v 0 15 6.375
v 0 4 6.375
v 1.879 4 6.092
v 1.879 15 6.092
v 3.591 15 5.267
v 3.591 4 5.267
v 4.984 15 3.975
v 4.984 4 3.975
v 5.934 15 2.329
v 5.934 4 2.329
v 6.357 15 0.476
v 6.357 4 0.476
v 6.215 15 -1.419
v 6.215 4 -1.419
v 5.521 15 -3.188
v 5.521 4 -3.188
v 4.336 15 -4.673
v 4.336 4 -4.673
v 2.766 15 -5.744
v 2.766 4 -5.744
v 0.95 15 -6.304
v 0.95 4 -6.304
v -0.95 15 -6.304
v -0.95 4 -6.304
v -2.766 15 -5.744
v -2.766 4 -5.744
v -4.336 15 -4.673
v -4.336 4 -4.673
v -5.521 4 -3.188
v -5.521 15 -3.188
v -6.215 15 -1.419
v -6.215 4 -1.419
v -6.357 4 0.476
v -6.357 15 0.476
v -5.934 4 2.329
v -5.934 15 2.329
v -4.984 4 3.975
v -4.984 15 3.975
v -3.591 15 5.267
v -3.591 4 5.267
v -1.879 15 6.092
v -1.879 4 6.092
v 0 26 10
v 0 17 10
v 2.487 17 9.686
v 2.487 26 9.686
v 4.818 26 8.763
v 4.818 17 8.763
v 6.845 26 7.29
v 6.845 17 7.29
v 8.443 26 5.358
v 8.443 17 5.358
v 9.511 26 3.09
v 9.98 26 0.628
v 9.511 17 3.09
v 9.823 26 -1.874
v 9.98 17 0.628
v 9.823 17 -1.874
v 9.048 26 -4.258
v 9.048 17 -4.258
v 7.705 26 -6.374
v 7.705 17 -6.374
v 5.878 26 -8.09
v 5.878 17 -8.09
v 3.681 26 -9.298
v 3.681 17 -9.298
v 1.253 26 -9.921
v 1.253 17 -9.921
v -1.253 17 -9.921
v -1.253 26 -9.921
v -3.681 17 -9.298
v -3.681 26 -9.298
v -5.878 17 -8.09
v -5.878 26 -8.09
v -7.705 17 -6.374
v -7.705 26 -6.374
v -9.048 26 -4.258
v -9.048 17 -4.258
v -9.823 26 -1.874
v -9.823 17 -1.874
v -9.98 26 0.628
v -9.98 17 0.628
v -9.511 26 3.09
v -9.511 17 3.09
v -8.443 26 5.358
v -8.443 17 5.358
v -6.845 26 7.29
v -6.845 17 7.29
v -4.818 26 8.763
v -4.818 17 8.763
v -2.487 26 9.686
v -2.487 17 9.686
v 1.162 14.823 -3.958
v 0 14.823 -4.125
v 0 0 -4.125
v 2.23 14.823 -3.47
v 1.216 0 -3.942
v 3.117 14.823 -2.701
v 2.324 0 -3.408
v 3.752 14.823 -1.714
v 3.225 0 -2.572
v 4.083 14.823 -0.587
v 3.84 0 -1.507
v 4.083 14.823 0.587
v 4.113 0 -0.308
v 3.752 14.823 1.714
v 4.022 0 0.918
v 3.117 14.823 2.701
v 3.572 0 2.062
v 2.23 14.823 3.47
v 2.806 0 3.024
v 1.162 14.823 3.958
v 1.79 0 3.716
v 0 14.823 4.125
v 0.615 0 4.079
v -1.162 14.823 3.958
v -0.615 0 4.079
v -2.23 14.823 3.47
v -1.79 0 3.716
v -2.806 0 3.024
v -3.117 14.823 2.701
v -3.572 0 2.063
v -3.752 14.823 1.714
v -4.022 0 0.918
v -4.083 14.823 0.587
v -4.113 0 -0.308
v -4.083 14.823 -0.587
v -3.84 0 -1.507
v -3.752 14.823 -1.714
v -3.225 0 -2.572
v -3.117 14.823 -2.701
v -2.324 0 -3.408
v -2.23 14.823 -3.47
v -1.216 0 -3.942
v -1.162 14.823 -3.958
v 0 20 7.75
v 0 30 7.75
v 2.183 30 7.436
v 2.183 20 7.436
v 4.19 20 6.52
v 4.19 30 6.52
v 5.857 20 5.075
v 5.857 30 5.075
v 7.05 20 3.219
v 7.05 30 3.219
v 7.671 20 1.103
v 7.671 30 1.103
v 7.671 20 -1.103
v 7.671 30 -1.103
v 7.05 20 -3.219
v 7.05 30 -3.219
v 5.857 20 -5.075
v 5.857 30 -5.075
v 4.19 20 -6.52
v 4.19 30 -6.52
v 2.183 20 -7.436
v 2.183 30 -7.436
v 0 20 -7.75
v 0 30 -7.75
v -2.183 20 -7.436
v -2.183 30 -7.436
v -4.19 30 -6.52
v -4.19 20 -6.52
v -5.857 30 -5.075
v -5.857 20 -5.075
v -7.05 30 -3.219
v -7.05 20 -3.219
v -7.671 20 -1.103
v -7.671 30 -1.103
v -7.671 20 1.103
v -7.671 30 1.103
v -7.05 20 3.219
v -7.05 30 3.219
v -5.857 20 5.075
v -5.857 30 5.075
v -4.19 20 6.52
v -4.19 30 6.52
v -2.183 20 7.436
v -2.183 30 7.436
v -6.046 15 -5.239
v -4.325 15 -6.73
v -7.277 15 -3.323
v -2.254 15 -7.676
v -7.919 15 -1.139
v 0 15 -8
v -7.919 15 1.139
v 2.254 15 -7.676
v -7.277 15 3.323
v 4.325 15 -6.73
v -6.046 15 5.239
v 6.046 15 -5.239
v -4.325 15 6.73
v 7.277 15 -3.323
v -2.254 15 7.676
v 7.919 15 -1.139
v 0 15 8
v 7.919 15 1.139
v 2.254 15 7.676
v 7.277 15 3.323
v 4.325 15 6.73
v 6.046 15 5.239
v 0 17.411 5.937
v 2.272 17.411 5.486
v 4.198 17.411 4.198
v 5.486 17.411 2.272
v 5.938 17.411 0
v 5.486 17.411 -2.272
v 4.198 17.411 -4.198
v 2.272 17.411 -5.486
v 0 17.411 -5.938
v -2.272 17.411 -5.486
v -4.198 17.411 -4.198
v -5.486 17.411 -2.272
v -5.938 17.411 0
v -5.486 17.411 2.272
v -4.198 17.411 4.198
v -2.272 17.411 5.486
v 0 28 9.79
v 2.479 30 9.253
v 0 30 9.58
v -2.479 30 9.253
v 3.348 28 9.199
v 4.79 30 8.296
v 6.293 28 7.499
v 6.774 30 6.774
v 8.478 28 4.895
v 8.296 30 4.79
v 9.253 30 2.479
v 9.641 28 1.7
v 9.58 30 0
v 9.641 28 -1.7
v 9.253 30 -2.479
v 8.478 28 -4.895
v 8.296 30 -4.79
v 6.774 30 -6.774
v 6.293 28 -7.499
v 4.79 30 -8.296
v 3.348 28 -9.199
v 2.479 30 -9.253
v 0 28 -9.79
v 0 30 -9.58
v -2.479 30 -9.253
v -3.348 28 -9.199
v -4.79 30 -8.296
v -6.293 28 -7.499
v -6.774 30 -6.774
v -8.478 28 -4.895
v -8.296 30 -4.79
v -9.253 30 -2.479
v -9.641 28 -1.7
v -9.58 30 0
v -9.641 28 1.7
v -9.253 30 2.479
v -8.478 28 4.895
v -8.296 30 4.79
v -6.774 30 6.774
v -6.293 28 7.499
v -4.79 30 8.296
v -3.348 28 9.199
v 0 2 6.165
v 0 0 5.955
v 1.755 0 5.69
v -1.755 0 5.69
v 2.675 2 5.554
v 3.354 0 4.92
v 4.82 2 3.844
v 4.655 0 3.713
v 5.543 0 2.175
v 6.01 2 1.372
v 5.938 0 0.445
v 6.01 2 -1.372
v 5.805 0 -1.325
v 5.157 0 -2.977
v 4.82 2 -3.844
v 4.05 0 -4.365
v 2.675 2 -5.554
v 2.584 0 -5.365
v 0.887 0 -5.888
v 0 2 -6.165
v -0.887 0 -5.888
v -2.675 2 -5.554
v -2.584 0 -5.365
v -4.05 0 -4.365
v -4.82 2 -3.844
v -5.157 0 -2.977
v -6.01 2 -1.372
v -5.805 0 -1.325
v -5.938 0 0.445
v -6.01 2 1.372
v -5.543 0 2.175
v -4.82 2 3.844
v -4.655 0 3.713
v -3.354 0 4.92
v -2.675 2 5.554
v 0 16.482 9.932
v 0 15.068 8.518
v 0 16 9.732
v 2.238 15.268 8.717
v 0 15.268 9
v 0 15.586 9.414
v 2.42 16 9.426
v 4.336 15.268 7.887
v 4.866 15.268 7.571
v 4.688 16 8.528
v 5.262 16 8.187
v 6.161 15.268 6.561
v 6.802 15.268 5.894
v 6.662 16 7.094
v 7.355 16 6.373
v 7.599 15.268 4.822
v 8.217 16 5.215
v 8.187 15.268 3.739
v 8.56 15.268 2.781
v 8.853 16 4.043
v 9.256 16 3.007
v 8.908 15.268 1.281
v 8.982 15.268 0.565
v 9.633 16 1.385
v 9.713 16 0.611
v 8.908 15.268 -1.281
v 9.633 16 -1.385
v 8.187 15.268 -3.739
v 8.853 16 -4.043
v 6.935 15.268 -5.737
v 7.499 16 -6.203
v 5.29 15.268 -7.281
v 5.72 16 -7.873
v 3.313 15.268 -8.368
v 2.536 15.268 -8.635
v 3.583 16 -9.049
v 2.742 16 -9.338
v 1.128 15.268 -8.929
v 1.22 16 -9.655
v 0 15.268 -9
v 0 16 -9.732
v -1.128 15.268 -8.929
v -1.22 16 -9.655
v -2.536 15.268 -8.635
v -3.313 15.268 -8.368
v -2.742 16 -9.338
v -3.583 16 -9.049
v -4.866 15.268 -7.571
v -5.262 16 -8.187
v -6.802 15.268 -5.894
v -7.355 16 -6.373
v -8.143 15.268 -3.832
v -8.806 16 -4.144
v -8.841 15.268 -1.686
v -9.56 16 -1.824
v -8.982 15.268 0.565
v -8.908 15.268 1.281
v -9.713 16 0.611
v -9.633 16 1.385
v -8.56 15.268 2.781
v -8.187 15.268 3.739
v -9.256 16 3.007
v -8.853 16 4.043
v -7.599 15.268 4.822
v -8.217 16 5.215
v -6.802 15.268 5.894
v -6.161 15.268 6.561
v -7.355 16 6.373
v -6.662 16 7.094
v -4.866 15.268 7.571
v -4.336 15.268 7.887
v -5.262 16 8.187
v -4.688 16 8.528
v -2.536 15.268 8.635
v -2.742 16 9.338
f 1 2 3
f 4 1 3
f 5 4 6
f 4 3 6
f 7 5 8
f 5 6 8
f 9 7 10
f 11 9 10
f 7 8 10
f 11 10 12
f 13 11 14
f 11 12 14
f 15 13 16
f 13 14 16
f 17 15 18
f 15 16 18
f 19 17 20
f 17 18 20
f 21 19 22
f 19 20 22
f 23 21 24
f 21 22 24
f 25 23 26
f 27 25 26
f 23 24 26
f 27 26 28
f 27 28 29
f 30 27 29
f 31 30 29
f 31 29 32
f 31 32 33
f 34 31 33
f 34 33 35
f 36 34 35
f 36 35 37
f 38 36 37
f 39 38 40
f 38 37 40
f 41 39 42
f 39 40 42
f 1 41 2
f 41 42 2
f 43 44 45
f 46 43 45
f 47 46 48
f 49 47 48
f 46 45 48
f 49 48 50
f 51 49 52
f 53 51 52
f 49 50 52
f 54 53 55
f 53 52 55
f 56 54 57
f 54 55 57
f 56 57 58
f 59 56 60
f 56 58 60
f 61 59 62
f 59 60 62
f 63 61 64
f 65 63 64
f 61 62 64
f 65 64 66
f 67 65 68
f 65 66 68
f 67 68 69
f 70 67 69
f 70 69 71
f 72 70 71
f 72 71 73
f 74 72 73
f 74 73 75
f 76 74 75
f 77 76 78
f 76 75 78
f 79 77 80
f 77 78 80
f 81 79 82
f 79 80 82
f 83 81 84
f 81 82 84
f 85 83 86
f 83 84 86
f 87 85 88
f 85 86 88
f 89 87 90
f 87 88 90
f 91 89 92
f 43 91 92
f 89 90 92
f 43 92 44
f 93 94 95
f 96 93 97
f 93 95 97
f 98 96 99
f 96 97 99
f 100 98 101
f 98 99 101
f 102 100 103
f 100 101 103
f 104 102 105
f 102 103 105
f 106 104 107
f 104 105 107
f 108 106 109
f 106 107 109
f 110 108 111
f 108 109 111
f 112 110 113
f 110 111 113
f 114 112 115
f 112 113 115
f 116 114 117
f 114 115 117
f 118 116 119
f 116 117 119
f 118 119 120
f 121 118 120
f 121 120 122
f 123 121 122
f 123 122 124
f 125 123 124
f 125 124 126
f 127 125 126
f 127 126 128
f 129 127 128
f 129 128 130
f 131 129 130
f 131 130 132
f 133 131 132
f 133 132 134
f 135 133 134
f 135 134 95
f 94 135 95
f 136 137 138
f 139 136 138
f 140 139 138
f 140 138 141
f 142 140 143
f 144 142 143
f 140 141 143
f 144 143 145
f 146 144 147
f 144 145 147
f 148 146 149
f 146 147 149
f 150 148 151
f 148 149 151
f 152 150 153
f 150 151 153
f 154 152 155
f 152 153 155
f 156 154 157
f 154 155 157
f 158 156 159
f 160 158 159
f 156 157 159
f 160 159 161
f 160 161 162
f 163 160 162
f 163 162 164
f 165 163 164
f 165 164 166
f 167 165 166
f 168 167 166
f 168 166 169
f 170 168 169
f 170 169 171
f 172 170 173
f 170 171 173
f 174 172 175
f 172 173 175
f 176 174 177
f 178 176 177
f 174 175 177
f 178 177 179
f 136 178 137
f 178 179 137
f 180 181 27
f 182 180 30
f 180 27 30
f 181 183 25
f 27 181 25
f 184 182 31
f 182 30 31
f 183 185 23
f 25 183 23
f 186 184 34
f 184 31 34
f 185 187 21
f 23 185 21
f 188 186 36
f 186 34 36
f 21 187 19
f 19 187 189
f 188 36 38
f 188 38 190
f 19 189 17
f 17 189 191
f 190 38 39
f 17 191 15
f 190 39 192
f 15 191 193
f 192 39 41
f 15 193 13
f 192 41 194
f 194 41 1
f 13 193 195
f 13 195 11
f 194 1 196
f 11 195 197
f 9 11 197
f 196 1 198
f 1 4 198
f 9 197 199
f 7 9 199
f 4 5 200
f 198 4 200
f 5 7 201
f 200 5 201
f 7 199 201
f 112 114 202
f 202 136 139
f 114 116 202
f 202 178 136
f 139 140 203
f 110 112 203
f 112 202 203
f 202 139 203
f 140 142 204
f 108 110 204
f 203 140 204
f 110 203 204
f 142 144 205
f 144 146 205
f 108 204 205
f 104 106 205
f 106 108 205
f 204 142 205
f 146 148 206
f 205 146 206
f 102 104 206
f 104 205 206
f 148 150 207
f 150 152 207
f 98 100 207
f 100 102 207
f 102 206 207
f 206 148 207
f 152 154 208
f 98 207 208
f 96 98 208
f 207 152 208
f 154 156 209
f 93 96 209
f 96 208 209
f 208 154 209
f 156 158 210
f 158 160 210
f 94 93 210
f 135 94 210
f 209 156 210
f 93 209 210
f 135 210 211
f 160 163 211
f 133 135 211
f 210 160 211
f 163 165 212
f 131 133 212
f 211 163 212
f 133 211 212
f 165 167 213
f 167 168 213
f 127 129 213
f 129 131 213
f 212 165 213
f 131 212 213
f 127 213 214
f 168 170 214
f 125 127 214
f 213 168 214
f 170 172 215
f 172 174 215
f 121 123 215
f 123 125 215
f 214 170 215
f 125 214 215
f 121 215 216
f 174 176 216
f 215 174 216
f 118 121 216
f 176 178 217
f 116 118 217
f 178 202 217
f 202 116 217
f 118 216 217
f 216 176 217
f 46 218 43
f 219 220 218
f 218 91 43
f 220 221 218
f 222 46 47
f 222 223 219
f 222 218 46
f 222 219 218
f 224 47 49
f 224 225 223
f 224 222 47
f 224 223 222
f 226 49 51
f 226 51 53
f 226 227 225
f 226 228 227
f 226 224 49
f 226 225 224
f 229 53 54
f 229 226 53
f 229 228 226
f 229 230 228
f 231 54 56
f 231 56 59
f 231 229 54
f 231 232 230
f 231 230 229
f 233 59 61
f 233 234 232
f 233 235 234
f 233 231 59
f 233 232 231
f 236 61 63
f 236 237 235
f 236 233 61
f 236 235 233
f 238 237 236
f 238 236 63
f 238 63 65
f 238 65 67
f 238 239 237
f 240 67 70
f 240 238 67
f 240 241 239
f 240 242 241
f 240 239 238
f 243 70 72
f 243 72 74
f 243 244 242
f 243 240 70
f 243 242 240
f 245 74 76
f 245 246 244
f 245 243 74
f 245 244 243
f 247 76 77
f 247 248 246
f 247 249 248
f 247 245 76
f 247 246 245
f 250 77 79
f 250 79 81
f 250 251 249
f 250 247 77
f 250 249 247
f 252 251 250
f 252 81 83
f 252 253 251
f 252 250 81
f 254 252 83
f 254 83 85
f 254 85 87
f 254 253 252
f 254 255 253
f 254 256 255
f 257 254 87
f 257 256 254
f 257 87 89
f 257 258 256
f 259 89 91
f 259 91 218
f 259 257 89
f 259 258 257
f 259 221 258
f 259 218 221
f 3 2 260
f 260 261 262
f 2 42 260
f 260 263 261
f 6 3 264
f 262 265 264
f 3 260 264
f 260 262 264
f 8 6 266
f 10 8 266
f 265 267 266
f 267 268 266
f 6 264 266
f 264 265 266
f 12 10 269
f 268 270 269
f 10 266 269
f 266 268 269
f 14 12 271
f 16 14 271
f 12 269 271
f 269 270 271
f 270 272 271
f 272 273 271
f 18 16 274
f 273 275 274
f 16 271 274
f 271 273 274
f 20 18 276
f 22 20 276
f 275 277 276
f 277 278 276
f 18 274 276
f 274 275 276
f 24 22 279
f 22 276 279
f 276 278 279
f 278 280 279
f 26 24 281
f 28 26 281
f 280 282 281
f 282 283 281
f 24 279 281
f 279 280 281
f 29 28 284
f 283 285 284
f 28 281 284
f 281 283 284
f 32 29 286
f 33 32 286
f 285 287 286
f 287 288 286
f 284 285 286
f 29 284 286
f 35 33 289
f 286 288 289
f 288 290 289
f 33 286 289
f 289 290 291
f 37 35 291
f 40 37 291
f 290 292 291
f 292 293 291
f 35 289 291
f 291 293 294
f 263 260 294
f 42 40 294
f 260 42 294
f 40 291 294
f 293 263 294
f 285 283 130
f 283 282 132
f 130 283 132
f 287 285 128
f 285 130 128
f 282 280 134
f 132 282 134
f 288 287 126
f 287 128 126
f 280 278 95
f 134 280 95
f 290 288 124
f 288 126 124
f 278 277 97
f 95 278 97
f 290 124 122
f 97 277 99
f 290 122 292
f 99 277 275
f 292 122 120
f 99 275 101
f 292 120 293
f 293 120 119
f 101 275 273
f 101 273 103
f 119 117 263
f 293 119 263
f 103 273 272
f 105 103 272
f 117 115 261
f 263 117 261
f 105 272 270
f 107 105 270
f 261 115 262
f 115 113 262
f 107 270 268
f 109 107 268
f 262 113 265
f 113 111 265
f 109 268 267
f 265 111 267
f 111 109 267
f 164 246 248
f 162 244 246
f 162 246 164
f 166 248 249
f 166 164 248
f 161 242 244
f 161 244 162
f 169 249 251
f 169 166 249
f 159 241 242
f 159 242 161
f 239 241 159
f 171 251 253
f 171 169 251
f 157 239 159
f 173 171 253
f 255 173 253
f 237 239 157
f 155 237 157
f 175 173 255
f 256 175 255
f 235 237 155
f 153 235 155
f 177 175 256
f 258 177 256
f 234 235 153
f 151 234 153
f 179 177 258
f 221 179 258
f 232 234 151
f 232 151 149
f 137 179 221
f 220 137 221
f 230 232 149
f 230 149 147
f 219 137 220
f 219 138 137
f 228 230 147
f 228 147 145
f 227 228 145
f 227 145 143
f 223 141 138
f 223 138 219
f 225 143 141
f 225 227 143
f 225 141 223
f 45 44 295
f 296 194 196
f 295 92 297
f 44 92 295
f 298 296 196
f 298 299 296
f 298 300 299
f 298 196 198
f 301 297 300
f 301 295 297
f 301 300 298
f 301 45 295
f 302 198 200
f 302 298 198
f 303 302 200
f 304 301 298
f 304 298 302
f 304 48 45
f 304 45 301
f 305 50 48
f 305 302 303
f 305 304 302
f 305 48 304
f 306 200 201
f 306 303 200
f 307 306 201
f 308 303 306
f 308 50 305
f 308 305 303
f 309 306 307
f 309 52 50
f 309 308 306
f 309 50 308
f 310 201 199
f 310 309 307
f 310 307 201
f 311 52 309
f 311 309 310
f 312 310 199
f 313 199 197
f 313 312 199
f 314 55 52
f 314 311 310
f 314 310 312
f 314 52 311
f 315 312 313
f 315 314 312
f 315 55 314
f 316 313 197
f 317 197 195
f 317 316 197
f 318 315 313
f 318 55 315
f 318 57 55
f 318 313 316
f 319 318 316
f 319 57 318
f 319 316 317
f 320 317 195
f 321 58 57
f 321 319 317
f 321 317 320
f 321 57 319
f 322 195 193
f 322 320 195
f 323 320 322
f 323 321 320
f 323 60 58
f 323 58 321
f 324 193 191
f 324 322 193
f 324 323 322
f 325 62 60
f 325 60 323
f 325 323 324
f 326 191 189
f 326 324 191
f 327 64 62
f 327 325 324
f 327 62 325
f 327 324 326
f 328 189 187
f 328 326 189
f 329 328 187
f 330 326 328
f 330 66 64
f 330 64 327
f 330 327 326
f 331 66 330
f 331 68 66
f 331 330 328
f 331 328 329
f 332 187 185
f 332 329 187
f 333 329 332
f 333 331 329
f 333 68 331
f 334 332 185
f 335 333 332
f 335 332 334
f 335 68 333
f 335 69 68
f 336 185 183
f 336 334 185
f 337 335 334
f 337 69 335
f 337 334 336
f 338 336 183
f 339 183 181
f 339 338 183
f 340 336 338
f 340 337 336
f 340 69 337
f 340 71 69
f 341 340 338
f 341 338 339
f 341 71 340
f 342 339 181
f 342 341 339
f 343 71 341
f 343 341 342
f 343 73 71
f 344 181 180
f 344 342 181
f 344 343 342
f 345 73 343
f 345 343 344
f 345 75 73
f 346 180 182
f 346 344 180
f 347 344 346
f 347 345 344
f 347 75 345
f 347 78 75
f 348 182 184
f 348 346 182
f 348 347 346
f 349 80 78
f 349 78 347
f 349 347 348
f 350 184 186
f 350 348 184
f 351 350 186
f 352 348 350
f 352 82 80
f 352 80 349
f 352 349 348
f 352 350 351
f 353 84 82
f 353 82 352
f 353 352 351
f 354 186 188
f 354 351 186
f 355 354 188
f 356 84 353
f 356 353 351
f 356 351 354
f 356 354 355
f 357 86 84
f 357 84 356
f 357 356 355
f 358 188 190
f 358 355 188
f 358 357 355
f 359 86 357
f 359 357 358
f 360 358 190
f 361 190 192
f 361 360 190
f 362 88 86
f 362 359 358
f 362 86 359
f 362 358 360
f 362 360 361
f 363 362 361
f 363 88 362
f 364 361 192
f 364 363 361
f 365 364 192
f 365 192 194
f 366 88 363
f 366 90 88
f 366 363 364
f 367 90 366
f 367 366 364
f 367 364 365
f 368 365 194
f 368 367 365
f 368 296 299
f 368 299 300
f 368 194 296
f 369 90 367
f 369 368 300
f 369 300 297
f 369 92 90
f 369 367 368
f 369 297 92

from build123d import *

# Parameters (mm, degrees)
SKETCH1_R           = 6.375
BOSS_EXTRUDE1_DEPTH = 15
SKETCH9_R           = 10
BOSS_EXTRUDE5_DEPTH = 15
SKETCH10_R          = 7.75
CUT_EXTRUDE4_DEPTH  = 10
SKETCH11_R          = 7.75
CUT_EXTRUDE5_DEPTH  = 7
CUT_EXTRUDE5_DRAFT  = -35
SKETCH12_R          = 4.125
CUT_EXTRUDE6_DEPTH  = 20
CHAMFER1_SIZE       = 4
CHAMFER1_SIZE2      = 0.420416941
CHAMFER2_SIZE       = 4
CHAMFER2_SIZE2      = 0.420416941
FILLET2_R           = 2


with BuildPart() as part:
    # Sketch1 → Boss-Extrude1 (new body)
    with BuildSketch(Plane(origin=(0, 0, 0), x_dir=(1, 0, 0), z_dir=(0, 1, 0))):
        with Locations(Location((0, 0, 0), (0, 0, 270))):
            Circle(SKETCH1_R)
    extrude(amount=BOSS_EXTRUDE1_DEPTH)

    # Sketch9 → Boss-Extrude5 (add)
    with BuildSketch(Plane(origin=(0, 15, 0), x_dir=(1, 0, 0), z_dir=(0, 1, 0))):
        with Locations(Location((0, 0, 0), (0, 0, 270))):
            Circle(SKETCH9_R)
    extrude(amount=BOSS_EXTRUDE5_DEPTH)

    # Sketch10 → Cut-Extrude4 (cut)
    with BuildSketch(Plane(origin=(0, 30, 0), x_dir=(1, 0, 0), z_dir=(0, 1, 0))):
        with Locations(Location((0, 0, 0), (0, 0, 270))):
            Circle(SKETCH10_R)
    extrude(amount=-CUT_EXTRUDE4_DEPTH, mode=Mode.SUBTRACT)


with BuildPart() as cut_extrude5_tool:
    # Sketch11 → Cut-Extrude5 (with draft: the straight prism first)
    with BuildSketch(Plane(origin=(0, 20, 0), x_dir=(1, 0, 0), z_dir=(0, 1, 0))):
        with Locations(Location((0, 0, 0), (0, 0, 270))):
            Circle(SKETCH11_R)
    extrude(amount=-CUT_EXTRUDE5_DEPTH)
    # Cut-Extrude5: the draft: its side faces are tilted about the plane it starts from
    cut_extrude5_sides = [cut_extrude5_tool.faces().sort_by_distance(p)[0] for p in [
        (0, 16.5, -7.75),
    ]]
    draft(cut_extrude5_sides, Plane(origin=(0, 20, 0), x_dir=(1, 0, 0), z_dir=(0, 1, 0)), CUT_EXTRUDE5_DRAFT)


with BuildPart() as part_1:
    add(part.part)

    # Cut-Extrude5: cut by cut_extrude5_tool
    add(cut_extrude5_tool.part, mode=Mode.SUBTRACT)

    # Sketch12 → Cut-Extrude6 (cut)
    with BuildSketch(Plane.XZ):
        with Locations(Location((0, 0, 0), (0, 0, 270))):
            Circle(SKETCH12_R)
    extrude(amount=-CUT_EXTRUDE6_DEPTH, mode=Mode.SUBTRACT)

    # Chamfer1
    chamfer1_edges = [part_1.edges().sort_by_distance(p)[0] for p in [
        (0, 30, -10),
    ]]
    chamfer1_side = [part_1.faces().sort_by_distance(p)[0] for p in [
        (0, 22.5, -10),
    ]]
    chamfer(chamfer1_edges, length=CHAMFER1_SIZE, length2=CHAMFER1_SIZE2, reference=chamfer1_side[0])

    # Chamfer2
    chamfer2_edges = [part_1.edges().sort_by_distance(p)[0] for p in [
        (0, 0, -6.375),
    ]]
    chamfer2_side = [part_1.faces().sort_by_distance(p)[0] for p in [
        (0, 7.5, -6.375),
    ]]
    chamfer(chamfer2_edges, length=CHAMFER2_SIZE, length2=CHAMFER2_SIZE2, reference=chamfer2_side[0])

    # Fillet2
    fillet2_edges = [part_1.edges().sort_by_distance(p)[0] for p in [
        (0, 15, -10),
    ]]
    fillet(fillet2_edges, radius=FILLET2_R)


solid = part_1.part
